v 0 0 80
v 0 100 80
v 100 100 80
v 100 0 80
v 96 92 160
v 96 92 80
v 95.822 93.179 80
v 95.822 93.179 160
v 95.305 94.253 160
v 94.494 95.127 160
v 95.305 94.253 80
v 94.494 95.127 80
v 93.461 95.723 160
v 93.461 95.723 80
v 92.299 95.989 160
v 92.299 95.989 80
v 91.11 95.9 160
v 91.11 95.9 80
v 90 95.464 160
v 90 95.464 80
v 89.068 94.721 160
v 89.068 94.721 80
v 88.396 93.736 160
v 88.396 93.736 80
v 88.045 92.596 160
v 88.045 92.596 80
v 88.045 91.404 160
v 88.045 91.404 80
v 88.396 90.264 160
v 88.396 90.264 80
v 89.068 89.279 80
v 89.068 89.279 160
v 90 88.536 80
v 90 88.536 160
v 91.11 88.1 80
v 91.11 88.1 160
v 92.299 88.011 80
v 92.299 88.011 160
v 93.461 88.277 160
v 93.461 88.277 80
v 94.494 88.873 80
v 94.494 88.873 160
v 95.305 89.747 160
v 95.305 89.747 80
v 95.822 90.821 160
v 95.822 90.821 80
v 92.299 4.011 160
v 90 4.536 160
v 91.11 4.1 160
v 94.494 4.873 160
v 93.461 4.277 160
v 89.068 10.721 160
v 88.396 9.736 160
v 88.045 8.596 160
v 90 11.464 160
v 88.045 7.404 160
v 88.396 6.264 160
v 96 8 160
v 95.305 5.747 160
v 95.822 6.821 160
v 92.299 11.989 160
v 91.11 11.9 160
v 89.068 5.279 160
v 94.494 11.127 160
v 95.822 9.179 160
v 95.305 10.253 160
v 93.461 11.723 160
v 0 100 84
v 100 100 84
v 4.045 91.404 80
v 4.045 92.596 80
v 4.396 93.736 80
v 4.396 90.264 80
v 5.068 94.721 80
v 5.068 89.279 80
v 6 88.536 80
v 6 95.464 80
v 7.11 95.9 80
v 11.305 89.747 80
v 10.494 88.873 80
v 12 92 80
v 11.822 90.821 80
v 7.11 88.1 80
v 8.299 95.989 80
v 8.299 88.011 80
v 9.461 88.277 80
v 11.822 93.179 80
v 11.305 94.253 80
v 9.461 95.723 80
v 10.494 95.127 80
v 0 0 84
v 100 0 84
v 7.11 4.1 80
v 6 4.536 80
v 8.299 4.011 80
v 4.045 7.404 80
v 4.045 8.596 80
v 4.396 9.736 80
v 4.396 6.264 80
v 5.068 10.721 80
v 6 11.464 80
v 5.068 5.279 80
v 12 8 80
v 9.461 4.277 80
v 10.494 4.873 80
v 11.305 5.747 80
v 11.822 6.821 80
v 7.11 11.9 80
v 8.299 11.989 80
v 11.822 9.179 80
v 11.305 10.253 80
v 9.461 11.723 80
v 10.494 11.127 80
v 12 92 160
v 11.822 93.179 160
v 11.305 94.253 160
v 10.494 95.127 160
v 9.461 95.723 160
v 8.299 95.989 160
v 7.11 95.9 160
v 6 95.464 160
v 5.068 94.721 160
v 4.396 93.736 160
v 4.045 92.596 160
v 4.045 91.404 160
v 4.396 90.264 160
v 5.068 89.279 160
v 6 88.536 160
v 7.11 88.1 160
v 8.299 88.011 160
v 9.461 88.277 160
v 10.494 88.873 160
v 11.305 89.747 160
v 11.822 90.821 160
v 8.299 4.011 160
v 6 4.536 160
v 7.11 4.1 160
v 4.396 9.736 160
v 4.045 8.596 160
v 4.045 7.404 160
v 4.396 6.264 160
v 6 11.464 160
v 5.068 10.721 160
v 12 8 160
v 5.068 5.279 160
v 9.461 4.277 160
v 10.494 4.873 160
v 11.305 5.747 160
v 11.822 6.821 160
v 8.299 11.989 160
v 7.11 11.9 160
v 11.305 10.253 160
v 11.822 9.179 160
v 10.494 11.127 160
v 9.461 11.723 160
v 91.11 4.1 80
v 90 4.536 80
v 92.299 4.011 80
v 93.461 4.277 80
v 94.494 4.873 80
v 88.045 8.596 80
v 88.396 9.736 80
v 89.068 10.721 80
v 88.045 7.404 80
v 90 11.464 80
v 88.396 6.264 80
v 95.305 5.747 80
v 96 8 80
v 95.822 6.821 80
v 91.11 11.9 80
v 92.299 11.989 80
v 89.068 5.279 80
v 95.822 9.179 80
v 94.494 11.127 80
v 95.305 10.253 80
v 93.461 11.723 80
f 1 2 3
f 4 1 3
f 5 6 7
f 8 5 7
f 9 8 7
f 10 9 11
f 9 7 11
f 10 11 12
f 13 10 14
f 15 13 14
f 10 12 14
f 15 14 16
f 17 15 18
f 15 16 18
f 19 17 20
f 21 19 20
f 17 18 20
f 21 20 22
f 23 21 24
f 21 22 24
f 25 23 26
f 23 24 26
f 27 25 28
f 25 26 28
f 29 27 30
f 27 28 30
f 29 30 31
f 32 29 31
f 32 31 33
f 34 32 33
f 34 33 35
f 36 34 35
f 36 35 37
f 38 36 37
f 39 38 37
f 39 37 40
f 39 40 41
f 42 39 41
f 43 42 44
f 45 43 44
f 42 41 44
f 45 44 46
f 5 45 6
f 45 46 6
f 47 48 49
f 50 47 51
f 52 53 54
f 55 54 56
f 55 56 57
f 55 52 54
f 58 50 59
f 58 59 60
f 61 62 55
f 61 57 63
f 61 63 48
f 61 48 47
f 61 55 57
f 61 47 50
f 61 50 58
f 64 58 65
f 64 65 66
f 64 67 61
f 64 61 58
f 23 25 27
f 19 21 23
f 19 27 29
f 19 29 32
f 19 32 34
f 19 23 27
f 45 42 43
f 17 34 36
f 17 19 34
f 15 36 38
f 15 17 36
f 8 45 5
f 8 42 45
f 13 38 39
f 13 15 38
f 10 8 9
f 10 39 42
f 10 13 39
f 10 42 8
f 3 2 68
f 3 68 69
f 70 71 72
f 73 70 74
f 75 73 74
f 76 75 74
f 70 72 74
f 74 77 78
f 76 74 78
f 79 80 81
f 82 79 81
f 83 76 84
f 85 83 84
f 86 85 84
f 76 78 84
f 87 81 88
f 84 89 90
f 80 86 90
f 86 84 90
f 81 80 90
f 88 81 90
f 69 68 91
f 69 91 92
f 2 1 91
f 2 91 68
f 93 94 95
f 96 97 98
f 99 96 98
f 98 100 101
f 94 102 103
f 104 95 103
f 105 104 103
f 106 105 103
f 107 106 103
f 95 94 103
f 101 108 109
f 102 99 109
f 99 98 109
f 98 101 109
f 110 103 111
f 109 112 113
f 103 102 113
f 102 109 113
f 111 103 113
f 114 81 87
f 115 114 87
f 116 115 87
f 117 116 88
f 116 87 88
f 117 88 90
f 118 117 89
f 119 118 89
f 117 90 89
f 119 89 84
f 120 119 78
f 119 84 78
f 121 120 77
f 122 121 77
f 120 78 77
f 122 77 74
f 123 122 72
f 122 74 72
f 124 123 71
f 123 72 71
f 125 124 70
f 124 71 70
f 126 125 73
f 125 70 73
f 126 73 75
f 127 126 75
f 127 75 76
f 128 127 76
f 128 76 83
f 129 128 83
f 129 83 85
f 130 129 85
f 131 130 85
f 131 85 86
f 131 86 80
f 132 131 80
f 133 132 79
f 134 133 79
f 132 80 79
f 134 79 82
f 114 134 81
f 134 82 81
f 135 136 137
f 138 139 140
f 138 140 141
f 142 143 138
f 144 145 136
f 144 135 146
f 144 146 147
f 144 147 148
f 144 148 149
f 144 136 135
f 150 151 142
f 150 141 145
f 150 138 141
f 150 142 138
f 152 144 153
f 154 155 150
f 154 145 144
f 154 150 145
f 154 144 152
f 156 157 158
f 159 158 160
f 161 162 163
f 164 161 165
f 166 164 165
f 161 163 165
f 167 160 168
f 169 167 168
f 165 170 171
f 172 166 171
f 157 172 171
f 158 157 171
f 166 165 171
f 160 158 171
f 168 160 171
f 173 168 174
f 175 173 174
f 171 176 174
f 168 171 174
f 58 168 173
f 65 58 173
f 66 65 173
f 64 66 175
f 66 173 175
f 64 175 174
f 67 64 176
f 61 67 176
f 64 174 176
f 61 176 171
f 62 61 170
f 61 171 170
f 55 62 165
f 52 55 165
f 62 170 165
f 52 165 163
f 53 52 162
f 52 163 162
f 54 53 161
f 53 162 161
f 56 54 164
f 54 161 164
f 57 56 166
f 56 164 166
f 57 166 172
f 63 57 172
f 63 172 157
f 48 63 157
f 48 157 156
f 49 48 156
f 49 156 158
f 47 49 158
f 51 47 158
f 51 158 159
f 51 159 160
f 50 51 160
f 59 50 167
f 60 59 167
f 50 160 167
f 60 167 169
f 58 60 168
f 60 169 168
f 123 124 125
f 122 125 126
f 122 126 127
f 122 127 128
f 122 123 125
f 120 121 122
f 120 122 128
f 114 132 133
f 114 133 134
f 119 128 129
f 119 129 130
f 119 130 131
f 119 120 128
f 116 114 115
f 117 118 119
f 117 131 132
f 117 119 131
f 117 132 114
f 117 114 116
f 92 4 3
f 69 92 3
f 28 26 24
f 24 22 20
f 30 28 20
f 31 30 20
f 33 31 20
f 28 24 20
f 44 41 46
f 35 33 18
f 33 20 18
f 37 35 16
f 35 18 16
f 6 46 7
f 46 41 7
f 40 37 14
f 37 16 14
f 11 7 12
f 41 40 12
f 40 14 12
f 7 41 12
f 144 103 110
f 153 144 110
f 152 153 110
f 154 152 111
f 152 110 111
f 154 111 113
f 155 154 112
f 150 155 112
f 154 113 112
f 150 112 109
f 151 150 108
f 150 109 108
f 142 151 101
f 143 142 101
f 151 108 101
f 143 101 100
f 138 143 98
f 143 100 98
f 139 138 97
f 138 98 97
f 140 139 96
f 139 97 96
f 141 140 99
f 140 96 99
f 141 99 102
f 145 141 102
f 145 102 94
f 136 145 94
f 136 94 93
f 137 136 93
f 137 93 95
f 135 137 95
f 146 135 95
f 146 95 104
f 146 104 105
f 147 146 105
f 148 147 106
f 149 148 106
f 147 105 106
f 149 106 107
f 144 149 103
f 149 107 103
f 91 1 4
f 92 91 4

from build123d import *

# Parameters (mm, degrees)
BOX_W             = 100
BOX_H             = 100
BOX_DEPTH         = 4
CYLINDER_R        = 4
CYLINDER_DEPTH    = 80
CYLINDER001_R     = 4
CYLINDER001_DEPTH = 80
CYLINDER002_R     = 4
CYLINDER002_DEPTH = 80
CYLINDER003_R     = 4
CYLINDER003_DEPTH = 80


with BuildPart() as cube:
    # Box → Box (new body)
    with BuildSketch(Plane.XY.offset(80)):
        with Locations((50, 50)):
            Rectangle(BOX_W, BOX_H)
    extrude(amount=BOX_DEPTH)


with BuildPart() as cylindre:
    # Cylinder → Cylinder (new body)
    with BuildSketch(Plane(origin=(8, 8, 80), x_dir=(1, 0, 0), z_dir=(0, 0, 1))):
        Circle(CYLINDER_R)
    extrude(amount=CYLINDER_DEPTH)


with BuildPart() as cylindre001:
    # Cylinder001 → Cylinder001 (new body)
    with BuildSketch(Plane(origin=(92, 8, 80), x_dir=(1, 0, 0), z_dir=(0, 0, 1))):
        Circle(CYLINDER001_R)
    extrude(amount=CYLINDER001_DEPTH)


with BuildPart() as cylindre002:
    # Cylinder002 → Cylinder002 (new body)
    with BuildSketch(Plane(origin=(92, 92, 80), x_dir=(1, 0, 0), z_dir=(0, 0, 1))):
        Circle(CYLINDER002_R)
    extrude(amount=CYLINDER002_DEPTH)


with BuildPart() as cylindre003:
    # Cylinder003 → Cylinder003 (new body)
    with BuildSketch(Plane(origin=(8, 92, 80), x_dir=(1, 0, 0), z_dir=(0, 0, 1))):
        Circle(CYLINDER003_R)
    extrude(amount=CYLINDER003_DEPTH)


solid = Compound([cube.part, cylindre.part, cylindre001.part, cylindre002.part, cylindre003.part])
